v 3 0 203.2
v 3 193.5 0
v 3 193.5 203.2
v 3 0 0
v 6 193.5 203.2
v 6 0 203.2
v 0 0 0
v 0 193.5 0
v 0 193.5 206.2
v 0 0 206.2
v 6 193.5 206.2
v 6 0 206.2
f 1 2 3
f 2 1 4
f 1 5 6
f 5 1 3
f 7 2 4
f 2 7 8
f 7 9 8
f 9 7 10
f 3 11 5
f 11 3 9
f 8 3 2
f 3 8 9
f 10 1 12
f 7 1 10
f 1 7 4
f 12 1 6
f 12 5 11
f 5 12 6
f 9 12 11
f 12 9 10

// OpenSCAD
inner_thickness=3;
inner_overlap=20;
inner_x=25.4*6.5+(3*inner_thickness);
inner_y=25.4*7.5;
inner_z=25.4*8;

union(){
cube([inner_thickness, inner_y+inner_thickness, inner_z]);
translate([0,0,inner_z])
color("green")
cube([inner_thickness*2, inner_y+inner_thickness,inner_thickness]);
    }
